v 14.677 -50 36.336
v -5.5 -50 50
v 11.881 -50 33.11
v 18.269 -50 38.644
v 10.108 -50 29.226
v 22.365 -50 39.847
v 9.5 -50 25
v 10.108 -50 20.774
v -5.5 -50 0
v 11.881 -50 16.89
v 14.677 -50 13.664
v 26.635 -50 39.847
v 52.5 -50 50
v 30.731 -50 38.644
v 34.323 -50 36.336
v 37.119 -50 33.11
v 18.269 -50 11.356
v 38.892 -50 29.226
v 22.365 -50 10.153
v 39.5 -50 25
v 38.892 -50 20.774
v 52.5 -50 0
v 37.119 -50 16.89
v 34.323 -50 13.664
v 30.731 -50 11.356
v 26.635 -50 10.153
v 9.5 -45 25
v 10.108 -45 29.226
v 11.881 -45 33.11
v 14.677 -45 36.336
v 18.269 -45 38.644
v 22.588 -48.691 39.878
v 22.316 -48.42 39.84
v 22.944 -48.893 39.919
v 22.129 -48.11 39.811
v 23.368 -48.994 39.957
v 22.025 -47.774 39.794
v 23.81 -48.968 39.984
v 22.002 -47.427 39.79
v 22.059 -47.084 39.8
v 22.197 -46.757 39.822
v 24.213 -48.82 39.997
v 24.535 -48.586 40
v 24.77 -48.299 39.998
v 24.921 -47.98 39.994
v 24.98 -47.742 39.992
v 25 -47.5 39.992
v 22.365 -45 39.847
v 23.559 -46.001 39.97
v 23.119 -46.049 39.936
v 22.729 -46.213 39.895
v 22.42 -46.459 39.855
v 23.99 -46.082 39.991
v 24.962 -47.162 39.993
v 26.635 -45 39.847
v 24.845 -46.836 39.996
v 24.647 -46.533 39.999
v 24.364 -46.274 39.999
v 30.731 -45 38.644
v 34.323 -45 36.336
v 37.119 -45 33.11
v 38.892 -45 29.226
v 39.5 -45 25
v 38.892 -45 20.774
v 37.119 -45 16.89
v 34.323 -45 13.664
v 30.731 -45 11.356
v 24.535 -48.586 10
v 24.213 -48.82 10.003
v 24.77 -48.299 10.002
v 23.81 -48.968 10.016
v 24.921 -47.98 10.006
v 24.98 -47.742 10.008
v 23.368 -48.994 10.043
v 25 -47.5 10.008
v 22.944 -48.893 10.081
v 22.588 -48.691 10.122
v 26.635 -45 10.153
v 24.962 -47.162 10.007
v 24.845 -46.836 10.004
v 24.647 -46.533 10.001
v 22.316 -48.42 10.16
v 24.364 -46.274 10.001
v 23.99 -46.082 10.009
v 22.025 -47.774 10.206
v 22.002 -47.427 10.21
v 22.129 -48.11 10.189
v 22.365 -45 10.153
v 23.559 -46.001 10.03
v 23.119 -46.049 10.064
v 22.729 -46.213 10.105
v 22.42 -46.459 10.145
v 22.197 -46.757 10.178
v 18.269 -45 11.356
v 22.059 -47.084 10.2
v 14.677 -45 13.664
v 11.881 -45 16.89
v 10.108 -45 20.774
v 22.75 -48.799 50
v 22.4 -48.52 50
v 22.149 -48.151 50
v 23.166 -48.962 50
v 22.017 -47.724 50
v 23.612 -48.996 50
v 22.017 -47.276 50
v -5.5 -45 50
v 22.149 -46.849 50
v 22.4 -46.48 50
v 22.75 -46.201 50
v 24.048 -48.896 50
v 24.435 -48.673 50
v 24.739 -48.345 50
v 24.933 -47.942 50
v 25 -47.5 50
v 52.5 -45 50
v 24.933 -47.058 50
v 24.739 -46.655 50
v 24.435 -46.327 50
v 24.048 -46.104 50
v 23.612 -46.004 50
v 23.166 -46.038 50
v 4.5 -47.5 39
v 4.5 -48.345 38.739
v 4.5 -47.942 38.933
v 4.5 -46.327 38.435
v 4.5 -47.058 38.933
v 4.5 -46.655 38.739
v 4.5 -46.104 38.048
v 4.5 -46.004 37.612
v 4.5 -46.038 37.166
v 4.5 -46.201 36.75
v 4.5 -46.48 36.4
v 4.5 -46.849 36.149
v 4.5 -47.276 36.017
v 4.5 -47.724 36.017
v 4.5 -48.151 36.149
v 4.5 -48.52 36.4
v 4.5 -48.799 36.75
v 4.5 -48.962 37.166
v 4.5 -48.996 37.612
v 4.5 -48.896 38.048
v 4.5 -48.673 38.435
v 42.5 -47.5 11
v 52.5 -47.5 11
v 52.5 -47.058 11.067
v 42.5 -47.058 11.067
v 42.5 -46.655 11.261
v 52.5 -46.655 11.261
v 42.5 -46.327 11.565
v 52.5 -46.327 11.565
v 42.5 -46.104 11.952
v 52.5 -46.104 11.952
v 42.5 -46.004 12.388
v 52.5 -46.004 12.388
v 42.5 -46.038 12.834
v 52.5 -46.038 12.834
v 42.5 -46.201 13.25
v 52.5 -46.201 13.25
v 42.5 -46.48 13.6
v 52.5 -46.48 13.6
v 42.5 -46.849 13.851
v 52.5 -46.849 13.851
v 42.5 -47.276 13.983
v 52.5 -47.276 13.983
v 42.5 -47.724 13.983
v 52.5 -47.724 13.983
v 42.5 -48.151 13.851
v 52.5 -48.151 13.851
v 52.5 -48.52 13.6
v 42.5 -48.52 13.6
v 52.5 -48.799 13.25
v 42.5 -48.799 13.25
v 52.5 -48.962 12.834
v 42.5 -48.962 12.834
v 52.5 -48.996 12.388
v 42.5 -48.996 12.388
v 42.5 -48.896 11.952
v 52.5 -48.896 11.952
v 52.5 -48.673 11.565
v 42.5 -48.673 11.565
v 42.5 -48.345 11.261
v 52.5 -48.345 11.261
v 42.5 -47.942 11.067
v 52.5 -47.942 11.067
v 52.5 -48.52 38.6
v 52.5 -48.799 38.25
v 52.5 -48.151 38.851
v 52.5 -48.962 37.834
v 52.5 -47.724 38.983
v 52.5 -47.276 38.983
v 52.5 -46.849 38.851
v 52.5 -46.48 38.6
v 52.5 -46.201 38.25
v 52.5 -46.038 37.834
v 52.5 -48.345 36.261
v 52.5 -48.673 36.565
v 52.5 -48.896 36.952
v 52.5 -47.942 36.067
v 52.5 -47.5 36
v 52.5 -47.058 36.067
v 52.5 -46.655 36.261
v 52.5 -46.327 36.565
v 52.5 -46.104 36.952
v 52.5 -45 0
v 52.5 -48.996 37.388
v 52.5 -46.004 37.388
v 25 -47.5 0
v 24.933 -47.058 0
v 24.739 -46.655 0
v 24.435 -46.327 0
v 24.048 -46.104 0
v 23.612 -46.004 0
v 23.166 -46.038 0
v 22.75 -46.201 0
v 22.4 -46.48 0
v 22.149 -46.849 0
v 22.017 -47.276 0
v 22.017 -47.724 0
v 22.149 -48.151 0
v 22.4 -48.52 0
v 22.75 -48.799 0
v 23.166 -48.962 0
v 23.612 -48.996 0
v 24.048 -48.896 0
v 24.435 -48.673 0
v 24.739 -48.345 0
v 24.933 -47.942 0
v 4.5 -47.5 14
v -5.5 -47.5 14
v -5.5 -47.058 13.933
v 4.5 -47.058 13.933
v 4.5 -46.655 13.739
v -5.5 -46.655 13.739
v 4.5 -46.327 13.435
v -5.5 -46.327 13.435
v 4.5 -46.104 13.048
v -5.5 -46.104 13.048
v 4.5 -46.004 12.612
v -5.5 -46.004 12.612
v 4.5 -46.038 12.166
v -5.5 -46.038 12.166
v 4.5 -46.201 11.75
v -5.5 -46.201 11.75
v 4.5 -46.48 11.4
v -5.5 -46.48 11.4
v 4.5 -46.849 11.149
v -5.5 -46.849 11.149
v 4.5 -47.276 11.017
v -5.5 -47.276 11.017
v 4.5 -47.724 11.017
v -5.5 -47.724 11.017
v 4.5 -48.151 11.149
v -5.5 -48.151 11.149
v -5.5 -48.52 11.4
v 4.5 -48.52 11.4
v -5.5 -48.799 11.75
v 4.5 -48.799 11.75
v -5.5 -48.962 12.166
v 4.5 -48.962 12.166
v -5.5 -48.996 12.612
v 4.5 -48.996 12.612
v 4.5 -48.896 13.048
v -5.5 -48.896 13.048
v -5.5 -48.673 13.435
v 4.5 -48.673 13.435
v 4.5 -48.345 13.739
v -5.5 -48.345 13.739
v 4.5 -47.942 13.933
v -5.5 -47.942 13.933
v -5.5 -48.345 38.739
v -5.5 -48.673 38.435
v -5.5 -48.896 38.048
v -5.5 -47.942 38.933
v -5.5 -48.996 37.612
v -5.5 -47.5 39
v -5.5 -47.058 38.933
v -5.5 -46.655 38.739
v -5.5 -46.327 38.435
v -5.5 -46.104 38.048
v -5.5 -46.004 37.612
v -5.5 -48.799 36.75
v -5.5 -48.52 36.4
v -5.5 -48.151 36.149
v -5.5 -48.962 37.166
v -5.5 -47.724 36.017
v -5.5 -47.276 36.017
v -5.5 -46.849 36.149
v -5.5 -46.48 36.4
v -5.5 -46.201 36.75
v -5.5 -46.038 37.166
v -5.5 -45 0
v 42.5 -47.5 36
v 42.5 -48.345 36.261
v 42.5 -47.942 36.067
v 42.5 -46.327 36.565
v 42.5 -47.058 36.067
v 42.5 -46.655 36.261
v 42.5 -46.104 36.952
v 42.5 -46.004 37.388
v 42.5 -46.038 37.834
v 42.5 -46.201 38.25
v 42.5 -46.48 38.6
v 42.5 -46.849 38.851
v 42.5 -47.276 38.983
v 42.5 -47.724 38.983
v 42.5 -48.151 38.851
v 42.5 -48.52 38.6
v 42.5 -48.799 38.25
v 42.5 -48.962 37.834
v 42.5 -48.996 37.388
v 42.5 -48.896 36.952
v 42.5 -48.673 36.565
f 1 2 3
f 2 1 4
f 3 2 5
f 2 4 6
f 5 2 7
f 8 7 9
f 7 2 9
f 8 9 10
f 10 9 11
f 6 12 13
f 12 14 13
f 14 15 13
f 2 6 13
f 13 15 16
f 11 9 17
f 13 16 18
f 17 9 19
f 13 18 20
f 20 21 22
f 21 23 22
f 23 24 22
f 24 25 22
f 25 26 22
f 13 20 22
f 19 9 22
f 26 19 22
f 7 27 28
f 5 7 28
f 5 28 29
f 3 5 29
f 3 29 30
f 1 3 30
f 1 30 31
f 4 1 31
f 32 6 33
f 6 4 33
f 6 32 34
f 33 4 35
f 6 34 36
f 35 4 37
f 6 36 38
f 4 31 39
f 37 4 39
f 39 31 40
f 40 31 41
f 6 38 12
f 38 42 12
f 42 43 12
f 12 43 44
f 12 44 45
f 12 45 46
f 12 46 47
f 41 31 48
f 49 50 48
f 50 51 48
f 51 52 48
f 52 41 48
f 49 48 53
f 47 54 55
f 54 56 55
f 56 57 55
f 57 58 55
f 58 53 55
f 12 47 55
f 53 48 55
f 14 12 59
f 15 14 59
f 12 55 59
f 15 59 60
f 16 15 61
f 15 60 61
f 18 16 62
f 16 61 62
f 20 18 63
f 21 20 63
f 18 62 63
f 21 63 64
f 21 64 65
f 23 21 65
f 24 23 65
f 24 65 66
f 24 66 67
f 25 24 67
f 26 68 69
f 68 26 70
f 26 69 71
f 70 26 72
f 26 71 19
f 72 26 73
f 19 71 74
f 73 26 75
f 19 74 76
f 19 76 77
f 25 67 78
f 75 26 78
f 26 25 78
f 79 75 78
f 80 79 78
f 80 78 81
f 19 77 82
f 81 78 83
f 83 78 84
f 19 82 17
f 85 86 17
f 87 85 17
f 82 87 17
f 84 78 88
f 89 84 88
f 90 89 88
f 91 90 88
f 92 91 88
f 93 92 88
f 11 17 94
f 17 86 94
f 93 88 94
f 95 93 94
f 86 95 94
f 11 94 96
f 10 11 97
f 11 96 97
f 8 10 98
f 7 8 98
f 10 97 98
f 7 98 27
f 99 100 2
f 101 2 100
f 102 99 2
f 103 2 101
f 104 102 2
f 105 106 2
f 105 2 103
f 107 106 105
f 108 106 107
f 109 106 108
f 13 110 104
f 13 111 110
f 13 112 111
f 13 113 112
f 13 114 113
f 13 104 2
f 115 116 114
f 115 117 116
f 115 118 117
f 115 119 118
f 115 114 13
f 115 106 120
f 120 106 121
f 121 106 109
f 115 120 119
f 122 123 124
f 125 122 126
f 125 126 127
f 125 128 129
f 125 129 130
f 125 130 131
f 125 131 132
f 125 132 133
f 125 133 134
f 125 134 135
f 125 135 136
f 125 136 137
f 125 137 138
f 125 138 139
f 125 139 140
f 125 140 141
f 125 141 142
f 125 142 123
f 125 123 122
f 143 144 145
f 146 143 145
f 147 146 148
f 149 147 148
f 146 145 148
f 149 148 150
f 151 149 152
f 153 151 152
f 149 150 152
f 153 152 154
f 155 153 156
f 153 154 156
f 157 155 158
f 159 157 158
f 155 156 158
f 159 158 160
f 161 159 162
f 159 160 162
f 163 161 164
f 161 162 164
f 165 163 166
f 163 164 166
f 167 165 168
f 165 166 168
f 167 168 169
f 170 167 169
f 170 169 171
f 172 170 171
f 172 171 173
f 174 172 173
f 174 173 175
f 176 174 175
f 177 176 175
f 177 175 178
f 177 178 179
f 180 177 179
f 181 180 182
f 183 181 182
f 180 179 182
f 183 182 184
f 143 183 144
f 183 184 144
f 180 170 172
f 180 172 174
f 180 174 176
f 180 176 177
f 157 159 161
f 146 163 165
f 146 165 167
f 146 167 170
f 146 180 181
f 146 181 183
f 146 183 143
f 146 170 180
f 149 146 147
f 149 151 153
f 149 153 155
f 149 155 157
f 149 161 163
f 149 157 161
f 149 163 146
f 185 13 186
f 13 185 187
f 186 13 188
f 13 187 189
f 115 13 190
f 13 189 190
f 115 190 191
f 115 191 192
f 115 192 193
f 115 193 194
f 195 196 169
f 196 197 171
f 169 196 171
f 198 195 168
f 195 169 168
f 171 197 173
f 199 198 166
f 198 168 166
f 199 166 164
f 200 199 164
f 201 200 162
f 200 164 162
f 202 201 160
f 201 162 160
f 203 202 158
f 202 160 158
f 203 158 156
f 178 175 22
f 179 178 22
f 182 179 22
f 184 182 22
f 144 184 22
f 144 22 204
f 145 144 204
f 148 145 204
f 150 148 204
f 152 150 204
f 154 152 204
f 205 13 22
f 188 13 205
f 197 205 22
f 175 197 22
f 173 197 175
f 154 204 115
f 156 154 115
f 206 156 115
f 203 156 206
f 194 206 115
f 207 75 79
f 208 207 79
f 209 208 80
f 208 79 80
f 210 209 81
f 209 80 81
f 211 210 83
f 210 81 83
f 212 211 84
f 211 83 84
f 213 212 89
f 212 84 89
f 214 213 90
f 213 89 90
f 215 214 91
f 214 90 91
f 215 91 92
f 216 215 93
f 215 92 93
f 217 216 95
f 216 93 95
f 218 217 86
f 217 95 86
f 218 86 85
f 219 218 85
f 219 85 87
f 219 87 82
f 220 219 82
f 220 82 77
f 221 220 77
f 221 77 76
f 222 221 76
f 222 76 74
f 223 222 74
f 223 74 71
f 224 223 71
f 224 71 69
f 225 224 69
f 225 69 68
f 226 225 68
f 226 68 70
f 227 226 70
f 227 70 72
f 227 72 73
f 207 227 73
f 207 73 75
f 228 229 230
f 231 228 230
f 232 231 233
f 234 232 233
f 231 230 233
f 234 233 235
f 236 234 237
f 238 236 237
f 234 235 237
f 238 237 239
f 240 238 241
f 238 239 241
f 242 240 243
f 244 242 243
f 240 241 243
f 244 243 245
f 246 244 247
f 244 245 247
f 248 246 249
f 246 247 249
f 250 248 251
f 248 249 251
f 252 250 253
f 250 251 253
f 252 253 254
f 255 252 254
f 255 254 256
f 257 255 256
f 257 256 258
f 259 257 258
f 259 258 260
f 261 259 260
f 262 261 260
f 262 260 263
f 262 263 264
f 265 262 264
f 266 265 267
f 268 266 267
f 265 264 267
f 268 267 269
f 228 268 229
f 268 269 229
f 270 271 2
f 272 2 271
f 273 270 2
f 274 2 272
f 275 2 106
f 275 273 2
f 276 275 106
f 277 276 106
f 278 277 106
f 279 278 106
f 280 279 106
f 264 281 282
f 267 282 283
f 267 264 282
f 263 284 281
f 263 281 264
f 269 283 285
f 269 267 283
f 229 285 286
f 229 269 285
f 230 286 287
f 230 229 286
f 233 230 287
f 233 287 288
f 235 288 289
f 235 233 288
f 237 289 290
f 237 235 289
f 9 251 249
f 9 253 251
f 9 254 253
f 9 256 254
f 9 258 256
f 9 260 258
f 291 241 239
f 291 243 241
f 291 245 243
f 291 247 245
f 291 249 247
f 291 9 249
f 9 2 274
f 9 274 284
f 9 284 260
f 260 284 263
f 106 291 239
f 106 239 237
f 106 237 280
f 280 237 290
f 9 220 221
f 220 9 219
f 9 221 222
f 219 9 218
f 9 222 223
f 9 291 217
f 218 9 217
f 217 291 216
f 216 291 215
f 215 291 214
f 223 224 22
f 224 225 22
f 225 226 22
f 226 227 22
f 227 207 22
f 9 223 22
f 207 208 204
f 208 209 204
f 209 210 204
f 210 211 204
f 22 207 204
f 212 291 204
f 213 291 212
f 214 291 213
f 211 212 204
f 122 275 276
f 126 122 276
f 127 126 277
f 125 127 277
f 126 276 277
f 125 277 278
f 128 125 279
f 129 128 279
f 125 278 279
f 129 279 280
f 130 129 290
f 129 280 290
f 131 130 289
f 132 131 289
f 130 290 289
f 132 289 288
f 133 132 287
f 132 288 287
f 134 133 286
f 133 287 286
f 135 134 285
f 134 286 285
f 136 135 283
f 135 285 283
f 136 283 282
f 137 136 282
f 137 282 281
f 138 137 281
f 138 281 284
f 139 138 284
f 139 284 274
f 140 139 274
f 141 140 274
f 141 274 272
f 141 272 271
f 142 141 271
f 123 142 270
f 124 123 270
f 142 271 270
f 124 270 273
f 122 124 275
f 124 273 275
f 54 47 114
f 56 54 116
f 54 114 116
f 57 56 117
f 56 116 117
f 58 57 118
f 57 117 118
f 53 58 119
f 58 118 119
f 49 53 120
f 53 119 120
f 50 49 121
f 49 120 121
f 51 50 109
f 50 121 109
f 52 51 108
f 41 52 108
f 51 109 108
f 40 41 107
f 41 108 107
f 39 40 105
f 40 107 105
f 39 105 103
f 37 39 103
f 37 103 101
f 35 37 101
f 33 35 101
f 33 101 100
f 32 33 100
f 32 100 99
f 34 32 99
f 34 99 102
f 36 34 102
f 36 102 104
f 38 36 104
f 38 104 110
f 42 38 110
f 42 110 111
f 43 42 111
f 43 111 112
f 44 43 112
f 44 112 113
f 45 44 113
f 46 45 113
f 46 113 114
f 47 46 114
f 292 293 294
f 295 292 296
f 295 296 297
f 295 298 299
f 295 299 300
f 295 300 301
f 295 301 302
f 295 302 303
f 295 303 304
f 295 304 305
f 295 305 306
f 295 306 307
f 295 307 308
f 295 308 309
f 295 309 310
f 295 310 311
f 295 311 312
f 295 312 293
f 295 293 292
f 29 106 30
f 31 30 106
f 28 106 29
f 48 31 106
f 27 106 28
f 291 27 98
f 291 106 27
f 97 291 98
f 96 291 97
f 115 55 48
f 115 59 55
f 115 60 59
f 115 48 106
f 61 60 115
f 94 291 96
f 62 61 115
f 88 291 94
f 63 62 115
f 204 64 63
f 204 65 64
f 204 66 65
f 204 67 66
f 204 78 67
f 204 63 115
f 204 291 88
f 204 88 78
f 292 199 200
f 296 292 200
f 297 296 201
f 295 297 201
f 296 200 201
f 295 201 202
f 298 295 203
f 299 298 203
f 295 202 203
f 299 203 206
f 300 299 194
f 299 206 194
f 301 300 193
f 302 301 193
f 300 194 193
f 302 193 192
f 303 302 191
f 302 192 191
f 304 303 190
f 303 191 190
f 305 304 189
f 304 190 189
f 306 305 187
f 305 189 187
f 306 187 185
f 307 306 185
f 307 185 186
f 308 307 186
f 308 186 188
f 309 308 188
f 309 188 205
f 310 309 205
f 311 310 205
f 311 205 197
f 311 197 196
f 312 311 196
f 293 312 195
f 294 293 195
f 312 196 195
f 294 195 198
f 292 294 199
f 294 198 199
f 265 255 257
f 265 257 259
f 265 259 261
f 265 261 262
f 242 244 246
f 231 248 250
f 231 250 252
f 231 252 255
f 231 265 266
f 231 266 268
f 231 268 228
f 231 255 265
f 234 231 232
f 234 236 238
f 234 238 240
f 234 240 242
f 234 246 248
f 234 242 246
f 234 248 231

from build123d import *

# Parameters (mm, degrees)
ESQUISSE1_W             = 58
ESQUISSE1_H             = 5
BOSS_EXTRU_1_DEPTH      = 50
ESQUISSE2_R             = 15
ENL_V_MAT_EXTRU_1_DEPTH = 6
ESQUISSE3_R             = 1.5
ENL_V_MAT_EXTRU_2_DEPTH = 10
ESQUISSE4_R             = 1.5
ENL_V_MAT_EXTRU_3_DEPTH = 10
ESQUISSE5_R             = 1.5
ENL_V_MAT_EXTRU_4_DEPTH = 51


with BuildPart() as part:
    # Esquisse1 → Boss.-Extru.1 (new body)
    with BuildSketch(Plane.XY):
        with Locations((23.5, -47.5)):
            Rectangle(ESQUISSE1_W, ESQUISSE1_H)
    extrude(amount=BOSS_EXTRU_1_DEPTH)

    # Esquisse2 → Enlèv. mat.-Extru.1 (cut, through all)
    with BuildSketch(Plane(origin=(0, -45, 0), x_dir=(-1, 0, 0), z_dir=(0, 1, 0))):
        with Locations((-24.5, 25)):
            Circle(ESQUISSE2_R)
    extrude(amount=-ENL_V_MAT_EXTRU_1_DEPTH, mode=Mode.SUBTRACT)

    # Esquisse3 → Enlèv. mat.-Extru.2 (cut)
    with BuildSketch(Plane.ZY.offset(5.5)):
        with Locations((12.5, -47.5)):
            Circle(ESQUISSE3_R)
        with Locations((37.5, -47.5)):
            Circle(ESQUISSE3_R)
    extrude(amount=-ENL_V_MAT_EXTRU_2_DEPTH, mode=Mode.SUBTRACT)

    # Esquisse4 → Enlèv. mat.-Extru.3 (cut)
    with BuildSketch(Plane(origin=(52.5, 0, 0), x_dir=(0, 0, -1), z_dir=(1, 0, 0))):
        with Locations((-37.5, -47.5)):
            Circle(ESQUISSE4_R)
        with Locations((-12.5, -47.5)):
            Circle(ESQUISSE4_R)
    extrude(amount=-ENL_V_MAT_EXTRU_3_DEPTH, mode=Mode.SUBTRACT)

    # Esquisse5 → Enlèv. mat.-Extru.4 (cut, through all)
    with BuildSketch(Plane.XY.offset(50)):
        with Locations((23.5, -47.5)):
            Circle(ESQUISSE5_R)
    extrude(amount=-ENL_V_MAT_EXTRU_4_DEPTH, mode=Mode.SUBTRACT)


solid = part.part
